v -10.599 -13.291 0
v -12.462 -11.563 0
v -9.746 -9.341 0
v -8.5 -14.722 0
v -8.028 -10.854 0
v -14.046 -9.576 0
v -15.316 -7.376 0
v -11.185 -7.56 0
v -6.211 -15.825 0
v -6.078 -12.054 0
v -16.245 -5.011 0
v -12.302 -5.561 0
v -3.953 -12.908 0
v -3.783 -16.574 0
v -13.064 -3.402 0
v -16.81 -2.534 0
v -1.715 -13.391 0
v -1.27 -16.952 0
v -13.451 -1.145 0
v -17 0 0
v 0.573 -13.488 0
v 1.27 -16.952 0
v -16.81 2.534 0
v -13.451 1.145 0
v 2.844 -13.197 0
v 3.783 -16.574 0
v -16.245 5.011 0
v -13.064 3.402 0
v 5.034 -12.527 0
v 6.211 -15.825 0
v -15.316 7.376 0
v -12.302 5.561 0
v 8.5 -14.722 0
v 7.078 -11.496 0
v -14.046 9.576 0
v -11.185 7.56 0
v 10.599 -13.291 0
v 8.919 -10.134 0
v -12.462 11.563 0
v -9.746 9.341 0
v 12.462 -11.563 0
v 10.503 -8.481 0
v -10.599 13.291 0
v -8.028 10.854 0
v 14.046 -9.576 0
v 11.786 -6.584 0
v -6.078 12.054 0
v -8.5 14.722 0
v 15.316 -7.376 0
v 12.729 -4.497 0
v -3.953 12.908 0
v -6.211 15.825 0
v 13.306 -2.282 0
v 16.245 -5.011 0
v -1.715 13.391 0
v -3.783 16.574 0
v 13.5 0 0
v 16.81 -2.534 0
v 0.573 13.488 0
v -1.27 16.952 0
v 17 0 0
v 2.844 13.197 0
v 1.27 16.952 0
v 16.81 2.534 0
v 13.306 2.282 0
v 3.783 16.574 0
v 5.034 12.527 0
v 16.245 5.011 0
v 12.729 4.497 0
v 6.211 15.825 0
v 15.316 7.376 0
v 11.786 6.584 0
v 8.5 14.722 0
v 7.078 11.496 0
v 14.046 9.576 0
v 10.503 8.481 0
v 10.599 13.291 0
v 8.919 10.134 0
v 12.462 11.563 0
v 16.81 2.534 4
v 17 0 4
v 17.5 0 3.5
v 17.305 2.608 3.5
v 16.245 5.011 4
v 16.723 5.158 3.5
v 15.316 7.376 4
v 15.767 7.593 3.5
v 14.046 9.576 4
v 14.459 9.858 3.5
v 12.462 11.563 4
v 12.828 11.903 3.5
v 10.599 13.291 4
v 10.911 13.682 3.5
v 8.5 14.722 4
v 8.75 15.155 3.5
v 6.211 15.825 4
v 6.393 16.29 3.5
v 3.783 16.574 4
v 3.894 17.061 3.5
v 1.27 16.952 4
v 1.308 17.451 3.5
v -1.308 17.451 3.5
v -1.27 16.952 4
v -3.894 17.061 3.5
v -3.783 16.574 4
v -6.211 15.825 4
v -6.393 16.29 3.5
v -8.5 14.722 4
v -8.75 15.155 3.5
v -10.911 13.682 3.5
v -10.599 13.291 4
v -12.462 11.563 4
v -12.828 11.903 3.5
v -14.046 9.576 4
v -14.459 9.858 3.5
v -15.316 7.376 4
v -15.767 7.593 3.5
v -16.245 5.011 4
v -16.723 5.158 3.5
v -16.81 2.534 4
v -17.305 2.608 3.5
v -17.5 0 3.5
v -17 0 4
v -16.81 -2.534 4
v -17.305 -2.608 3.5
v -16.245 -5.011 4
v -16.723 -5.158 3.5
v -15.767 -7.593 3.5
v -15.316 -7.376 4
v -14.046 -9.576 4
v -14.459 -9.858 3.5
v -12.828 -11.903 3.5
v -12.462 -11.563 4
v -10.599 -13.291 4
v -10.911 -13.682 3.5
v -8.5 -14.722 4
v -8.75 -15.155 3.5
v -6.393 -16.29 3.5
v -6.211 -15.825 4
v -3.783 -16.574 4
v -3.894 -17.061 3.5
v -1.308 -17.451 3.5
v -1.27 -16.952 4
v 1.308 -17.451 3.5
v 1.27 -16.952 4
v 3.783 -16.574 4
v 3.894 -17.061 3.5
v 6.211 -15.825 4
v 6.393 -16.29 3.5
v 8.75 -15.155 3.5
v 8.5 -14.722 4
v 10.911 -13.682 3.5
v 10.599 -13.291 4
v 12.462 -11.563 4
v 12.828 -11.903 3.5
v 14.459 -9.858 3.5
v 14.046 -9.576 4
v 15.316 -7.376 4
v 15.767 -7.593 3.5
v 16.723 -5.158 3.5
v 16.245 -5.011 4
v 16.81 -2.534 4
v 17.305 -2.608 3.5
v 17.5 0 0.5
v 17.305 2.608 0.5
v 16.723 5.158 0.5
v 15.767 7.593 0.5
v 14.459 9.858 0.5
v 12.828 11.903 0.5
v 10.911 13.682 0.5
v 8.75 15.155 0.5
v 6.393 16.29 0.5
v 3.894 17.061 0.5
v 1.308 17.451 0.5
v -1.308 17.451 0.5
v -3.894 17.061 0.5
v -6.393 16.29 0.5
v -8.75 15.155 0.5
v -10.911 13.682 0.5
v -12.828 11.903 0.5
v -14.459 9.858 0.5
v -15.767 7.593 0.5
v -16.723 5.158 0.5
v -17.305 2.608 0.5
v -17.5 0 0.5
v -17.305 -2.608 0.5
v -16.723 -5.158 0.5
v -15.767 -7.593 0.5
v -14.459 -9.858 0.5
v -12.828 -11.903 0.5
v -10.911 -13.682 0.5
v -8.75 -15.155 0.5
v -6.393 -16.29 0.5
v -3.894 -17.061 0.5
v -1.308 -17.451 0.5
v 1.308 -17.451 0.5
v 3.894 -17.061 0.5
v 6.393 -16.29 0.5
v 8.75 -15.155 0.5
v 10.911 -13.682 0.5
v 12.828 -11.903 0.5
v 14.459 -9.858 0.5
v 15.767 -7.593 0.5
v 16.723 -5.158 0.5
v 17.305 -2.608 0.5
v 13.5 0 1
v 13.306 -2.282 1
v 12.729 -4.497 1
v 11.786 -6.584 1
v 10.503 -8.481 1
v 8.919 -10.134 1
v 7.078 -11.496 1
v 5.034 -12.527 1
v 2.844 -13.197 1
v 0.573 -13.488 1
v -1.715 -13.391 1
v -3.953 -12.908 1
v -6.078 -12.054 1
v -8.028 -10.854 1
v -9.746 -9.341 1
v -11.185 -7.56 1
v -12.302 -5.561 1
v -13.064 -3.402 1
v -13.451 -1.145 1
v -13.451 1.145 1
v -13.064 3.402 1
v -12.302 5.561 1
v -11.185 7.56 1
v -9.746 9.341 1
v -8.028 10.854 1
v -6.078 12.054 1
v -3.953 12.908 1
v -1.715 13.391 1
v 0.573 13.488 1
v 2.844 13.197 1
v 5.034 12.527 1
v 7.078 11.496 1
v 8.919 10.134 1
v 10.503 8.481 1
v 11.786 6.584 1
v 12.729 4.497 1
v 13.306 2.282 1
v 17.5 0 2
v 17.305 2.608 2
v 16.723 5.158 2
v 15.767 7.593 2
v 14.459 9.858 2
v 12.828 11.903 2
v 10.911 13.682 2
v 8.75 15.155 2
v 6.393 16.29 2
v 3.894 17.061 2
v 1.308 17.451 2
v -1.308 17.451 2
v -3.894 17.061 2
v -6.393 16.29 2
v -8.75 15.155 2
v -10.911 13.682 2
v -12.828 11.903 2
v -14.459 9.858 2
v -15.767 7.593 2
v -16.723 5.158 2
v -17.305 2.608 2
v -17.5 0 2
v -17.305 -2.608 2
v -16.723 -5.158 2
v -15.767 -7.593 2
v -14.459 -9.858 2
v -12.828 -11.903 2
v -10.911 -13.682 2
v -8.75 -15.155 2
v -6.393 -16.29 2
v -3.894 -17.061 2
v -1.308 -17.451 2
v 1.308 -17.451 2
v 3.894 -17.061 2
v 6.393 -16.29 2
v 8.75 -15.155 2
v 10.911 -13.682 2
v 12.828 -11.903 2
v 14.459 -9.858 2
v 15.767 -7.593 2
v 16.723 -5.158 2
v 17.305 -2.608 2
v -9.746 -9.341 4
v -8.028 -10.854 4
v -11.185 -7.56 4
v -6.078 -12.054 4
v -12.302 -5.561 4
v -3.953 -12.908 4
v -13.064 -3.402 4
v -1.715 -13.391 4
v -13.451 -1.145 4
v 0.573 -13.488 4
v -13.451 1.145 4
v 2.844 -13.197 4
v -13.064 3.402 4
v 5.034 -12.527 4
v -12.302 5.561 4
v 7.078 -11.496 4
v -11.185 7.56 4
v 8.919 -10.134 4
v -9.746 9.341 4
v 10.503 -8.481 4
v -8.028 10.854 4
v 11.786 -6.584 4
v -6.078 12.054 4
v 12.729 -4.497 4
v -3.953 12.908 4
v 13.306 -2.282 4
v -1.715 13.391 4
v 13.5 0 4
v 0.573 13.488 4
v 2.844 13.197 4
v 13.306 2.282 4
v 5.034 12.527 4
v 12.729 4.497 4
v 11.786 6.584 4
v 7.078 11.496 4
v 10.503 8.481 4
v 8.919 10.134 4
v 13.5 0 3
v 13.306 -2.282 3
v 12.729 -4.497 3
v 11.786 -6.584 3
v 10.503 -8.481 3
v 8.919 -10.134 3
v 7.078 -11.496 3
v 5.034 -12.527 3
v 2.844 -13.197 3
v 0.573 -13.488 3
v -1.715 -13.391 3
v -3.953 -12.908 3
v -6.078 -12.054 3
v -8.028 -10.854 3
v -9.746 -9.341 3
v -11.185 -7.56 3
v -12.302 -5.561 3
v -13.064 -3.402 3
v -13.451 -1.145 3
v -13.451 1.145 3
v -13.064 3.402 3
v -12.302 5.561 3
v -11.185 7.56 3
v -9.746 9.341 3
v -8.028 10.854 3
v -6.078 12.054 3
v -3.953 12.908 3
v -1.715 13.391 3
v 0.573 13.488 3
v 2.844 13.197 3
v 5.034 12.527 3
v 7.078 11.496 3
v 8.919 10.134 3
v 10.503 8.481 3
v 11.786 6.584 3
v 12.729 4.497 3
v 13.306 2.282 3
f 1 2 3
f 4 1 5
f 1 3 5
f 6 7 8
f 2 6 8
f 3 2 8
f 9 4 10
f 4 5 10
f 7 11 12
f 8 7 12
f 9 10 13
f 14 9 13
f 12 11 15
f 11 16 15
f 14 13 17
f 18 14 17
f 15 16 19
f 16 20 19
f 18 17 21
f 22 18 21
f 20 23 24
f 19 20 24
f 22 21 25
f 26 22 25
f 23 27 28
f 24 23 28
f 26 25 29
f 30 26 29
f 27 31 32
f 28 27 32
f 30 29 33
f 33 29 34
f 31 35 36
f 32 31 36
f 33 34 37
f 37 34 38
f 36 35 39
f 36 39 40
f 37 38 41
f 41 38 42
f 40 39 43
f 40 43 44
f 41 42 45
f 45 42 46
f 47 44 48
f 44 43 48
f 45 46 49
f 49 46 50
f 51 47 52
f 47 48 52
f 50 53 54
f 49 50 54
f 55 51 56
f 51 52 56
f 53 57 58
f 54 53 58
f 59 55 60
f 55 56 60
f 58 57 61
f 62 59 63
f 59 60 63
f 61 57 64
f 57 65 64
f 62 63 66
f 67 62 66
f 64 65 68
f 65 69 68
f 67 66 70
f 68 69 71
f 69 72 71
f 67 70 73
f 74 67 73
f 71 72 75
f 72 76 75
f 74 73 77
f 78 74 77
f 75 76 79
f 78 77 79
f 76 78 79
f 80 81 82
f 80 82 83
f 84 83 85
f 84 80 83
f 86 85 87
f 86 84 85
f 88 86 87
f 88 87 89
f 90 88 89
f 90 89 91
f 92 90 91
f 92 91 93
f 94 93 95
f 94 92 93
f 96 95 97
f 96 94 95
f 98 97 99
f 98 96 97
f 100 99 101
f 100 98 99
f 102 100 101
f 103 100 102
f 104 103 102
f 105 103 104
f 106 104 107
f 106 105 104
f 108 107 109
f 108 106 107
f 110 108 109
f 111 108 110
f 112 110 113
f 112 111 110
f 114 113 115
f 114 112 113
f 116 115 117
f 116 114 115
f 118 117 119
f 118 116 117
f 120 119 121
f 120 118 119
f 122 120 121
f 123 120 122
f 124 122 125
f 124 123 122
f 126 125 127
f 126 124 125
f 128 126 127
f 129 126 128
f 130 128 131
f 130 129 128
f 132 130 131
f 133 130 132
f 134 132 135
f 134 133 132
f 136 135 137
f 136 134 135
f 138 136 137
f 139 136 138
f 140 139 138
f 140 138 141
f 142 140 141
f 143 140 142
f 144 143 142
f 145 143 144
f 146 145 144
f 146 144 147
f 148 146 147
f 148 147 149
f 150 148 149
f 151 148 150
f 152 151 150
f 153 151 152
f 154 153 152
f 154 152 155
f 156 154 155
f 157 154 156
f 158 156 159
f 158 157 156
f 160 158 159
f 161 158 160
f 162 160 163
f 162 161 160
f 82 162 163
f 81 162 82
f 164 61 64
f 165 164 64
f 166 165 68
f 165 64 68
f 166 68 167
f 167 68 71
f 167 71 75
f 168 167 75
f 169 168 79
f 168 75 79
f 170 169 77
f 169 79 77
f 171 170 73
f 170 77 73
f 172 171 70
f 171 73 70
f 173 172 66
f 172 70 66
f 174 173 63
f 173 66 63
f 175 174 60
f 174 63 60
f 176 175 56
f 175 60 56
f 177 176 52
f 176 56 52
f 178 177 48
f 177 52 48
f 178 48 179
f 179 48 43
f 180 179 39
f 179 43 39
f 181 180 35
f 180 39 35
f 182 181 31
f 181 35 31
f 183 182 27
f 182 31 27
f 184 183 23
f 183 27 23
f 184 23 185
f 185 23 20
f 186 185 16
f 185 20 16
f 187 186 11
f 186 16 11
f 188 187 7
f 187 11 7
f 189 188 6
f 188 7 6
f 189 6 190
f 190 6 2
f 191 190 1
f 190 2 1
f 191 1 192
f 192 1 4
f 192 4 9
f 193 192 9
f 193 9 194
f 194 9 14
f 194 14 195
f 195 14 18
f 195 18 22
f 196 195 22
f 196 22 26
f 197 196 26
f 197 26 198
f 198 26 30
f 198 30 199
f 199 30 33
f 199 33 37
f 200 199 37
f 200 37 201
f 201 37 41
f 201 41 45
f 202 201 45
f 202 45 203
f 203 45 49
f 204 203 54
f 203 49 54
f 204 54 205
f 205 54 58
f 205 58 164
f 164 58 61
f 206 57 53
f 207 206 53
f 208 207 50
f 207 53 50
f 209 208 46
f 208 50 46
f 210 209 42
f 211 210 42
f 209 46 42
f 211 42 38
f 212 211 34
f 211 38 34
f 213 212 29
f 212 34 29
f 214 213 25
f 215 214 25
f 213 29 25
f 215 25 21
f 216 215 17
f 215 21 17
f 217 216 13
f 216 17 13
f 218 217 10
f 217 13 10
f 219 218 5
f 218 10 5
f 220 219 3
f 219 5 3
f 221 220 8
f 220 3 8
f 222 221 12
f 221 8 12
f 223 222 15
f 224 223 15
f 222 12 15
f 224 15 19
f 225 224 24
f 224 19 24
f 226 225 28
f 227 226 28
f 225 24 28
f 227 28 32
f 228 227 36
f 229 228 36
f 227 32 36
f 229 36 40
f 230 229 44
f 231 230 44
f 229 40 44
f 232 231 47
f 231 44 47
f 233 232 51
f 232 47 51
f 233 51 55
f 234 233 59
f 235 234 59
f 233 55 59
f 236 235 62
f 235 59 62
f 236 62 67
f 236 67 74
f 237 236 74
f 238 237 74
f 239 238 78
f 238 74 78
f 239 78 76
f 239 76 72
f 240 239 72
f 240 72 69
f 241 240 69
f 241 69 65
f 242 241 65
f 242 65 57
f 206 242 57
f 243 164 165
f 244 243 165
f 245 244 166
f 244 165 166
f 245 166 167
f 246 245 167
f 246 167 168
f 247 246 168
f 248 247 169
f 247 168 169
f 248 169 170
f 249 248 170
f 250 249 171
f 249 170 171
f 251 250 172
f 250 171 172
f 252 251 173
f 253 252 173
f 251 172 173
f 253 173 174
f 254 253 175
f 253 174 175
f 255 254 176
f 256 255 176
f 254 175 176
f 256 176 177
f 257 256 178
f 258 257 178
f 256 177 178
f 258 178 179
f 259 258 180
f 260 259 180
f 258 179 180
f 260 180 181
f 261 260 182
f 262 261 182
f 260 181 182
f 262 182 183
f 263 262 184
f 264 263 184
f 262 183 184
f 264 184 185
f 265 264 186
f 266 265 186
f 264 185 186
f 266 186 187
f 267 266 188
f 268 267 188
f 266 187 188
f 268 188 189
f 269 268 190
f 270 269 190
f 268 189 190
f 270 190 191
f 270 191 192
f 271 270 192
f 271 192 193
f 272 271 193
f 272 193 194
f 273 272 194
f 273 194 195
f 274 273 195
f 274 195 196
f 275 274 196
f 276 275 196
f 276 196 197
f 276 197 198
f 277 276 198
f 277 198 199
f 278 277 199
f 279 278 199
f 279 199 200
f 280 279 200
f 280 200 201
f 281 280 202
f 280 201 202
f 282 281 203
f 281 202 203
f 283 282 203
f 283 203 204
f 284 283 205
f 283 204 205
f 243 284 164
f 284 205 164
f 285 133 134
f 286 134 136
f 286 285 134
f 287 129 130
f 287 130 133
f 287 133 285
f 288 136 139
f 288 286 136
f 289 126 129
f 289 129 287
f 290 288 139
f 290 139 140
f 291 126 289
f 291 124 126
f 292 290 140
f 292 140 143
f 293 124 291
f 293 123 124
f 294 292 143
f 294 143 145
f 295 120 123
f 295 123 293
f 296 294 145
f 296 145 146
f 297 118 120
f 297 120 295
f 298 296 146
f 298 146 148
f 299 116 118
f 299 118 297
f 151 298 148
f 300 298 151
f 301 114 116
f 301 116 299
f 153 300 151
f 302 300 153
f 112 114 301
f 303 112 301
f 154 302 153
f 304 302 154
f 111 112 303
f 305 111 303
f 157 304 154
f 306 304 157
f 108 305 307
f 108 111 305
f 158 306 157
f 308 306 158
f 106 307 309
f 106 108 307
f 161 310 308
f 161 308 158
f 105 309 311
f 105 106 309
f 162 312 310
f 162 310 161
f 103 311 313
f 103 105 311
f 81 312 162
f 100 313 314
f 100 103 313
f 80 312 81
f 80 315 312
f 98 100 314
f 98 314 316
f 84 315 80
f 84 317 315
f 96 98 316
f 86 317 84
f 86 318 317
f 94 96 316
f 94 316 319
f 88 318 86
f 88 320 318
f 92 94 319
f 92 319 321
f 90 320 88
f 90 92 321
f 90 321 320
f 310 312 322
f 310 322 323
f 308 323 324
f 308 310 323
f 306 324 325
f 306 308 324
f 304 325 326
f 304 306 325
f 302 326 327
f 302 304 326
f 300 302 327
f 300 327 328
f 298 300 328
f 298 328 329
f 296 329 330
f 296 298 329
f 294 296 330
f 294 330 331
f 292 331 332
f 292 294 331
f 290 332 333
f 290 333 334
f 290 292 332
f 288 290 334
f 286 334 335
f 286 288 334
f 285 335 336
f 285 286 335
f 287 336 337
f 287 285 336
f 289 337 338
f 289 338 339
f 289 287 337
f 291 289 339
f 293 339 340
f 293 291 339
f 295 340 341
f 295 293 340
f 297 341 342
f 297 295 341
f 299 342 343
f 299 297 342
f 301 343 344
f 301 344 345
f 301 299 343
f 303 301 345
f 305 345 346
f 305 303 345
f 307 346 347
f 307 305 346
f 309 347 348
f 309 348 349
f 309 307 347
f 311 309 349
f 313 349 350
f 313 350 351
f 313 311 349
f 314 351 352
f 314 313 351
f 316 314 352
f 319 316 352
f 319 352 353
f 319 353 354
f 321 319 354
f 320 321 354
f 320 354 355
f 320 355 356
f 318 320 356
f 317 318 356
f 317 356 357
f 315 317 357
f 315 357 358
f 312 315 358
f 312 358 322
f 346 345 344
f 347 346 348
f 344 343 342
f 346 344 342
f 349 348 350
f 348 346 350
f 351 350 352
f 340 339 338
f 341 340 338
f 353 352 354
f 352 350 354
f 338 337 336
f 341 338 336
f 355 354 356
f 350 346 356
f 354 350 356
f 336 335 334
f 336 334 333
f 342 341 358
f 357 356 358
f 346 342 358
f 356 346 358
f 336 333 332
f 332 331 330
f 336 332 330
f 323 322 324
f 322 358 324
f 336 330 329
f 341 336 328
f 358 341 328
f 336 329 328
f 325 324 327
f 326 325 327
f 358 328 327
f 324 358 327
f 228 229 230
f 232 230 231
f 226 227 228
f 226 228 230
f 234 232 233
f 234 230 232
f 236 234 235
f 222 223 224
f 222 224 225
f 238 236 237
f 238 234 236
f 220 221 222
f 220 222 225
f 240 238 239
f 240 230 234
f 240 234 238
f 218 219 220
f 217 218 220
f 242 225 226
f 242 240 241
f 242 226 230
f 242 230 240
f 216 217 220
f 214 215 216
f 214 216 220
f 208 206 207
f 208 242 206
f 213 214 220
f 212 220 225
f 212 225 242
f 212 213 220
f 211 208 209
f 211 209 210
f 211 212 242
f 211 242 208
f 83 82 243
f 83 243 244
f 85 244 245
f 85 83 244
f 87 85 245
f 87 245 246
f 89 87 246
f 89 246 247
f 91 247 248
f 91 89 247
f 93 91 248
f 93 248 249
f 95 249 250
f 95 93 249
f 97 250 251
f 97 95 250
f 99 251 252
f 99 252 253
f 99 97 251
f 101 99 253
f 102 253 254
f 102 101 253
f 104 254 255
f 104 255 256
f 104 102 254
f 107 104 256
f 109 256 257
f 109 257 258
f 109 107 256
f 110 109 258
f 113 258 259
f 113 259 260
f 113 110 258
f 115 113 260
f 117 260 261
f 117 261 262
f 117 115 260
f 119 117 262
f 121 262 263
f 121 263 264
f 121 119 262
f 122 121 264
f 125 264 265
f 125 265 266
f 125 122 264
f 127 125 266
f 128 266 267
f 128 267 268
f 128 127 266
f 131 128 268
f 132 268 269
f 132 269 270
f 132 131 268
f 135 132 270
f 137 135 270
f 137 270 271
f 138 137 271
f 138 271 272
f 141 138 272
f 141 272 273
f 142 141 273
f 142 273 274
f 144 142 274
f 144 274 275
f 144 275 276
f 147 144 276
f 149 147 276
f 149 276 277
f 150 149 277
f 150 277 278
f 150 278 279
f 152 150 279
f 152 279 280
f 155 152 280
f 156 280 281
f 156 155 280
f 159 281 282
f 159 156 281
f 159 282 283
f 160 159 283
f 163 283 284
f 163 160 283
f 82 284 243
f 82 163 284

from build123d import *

# Parameters (mm, degrees)
F0_R     = 17.5
F1_DEPTH = 2
F2_R     = 13.5
F3_DEPTH = 1
F5_SIZE  = 0.5


with BuildPart() as f1:
    # F0 (on Top) → F1 (new body)
    with BuildSketch(Plane.XY):
        Circle(F0_R)
    extrude(amount=F1_DEPTH)

    # F2 (on face) → F3 (cut)
    with BuildSketch(Plane(origin=(0, 0, 0), x_dir=(1, 0, 0), z_dir=(0, 0, -1))):
        Circle(F2_R)
    extrude(amount=-F3_DEPTH, mode=Mode.SUBTRACT)

    # F4: F1 across face


with BuildPart() as f1_1:
    add(f1.part)
    add(f1.part.mirror(Plane.XY.offset(2)))

    # F5
    f5_edges = [f1_1.edges().sort_by_distance(p)[0] for p in [
        (-17.5, 0, 0),
        (17.5, 0, 2),
        (-17.5, 0, 4),
    ]]
    chamfer(f5_edges, length=F5_SIZE)


solid = f1_1.part
